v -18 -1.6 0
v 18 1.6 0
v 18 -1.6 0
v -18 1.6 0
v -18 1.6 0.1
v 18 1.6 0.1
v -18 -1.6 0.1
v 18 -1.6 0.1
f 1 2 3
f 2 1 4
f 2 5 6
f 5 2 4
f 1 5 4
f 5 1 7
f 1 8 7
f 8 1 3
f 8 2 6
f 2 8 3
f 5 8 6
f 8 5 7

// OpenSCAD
// file: ../p/box5-12.scad
use <../lib.scad>
function ldraw_lib__box5_12() = [
// 0 Box with 5 Faces without Any Edges
// 0 Name: box5-12.dat
// 0 Author: Chris Dee [cwdee]
// 0 !LDRAW_ORG Primitive UPDATE 2009-02
// 0 !LICENSE Licensed under CC BY 4.0 : see CAreadme.txt
// 
// 0 BFC CERTIFY CCW
  [0,"BFC","CERTIFY"],
  [0,"BFC","CCW"],
// 
// 0 !HISTORY 2009-09-03 [PTadmin] Official Update 2009-02
// 
// 
// 4 16 1 1 1 1 1 -1 -1 1 -1 -1 1 1
  [4,16,1,1,1,1,1,-1,-1,1,-1,-1,1,1],
// 4 16 -1 0 1 1 0 1 1 1 1 -1 1 1
  [4,16,-1,0,1,1,0,1,1,1,1,-1,1,1],
// 4 16 -1 0 -1 -1 0 1 -1 1 1 -1 1 -1
  [4,16,-1,0,-1,-1,0,1,-1,1,1,-1,1,-1],
// 4 16 1 0 -1 -1 0 -1 -1 1 -1 1 1 -1
  [4,16,1,0,-1,-1,0,-1,-1,1,-1,1,1,-1],
// 4 16 1 0 1 1 0 -1 1 1 -1 1 1 1
  [4,16,1,0,1,1,0,-1,1,1,-1,1,1,1],
// 0
];
module ldraw_lib__box5_12(step=0, col=false, unit=2/5, alt=false, line=0.2, solid=!$preview)
    makepoly(ldraw_lib__box5_12(), step=step, col=col, unit=unit, alt=alt, line=line, solid=solid);
ldraw_lib__box5_12(line=0.2);
// main file
use <../lib.scad>
use <../p/box5-12.scad>
function ldraw_lib__6372023i() = [
// 0 Sticker  0.4 x  4.5 with A-pillar in Bright Light Blue
// 0 Name: 6372023i.dat
// 0 Author: Magnus Forsberg [MagFors]
// 0 !LDRAW_ORG Part UPDATE 2024-06
// 0 !LICENSE Licensed under CC BY 4.0 : see CAreadme.txt
// 
// 0 BFC CERTIFY CCW
  [0,"BFC","CERTIFY"],
  [0,"BFC","CCW"],
// 
// 0 !KEYWORDS 500, Bricklink 77942stk01, Brickowl 1064764, Cinquecento, FIAT
// 0 !KEYWORDS Nuova, Rebrickable 83460, set 77942
// 
// 0 !HISTORY 2024-07-29 [OrionP] Official Update 2024-06
// 
// 
// 1 16 0 -.25 0 45 0 0 0 .25 0 0 0 4 box5-12.dat
  [1,16,0,-.25,0,45,0,0,0,.25,0,0,0,4, ldraw_lib__box5_12()],
// 4 212 45 -.25 4 -45 -.25 4 -45 -.25 -4 45 -.25 -4
  [4,212,45,-.25,4,-45,-.25,4,-45,-.25,-4,45,-.25,-4],
];
module ldraw_lib__6372023i(step=0, col=false, unit=2/5, alt=false, line=0.2, solid=!$preview)
    makepoly(ldraw_lib__6372023i(), step=step, col=col, unit=unit, alt=alt, line=line, solid=solid);
ldraw_lib__6372023i(line=0.2);
